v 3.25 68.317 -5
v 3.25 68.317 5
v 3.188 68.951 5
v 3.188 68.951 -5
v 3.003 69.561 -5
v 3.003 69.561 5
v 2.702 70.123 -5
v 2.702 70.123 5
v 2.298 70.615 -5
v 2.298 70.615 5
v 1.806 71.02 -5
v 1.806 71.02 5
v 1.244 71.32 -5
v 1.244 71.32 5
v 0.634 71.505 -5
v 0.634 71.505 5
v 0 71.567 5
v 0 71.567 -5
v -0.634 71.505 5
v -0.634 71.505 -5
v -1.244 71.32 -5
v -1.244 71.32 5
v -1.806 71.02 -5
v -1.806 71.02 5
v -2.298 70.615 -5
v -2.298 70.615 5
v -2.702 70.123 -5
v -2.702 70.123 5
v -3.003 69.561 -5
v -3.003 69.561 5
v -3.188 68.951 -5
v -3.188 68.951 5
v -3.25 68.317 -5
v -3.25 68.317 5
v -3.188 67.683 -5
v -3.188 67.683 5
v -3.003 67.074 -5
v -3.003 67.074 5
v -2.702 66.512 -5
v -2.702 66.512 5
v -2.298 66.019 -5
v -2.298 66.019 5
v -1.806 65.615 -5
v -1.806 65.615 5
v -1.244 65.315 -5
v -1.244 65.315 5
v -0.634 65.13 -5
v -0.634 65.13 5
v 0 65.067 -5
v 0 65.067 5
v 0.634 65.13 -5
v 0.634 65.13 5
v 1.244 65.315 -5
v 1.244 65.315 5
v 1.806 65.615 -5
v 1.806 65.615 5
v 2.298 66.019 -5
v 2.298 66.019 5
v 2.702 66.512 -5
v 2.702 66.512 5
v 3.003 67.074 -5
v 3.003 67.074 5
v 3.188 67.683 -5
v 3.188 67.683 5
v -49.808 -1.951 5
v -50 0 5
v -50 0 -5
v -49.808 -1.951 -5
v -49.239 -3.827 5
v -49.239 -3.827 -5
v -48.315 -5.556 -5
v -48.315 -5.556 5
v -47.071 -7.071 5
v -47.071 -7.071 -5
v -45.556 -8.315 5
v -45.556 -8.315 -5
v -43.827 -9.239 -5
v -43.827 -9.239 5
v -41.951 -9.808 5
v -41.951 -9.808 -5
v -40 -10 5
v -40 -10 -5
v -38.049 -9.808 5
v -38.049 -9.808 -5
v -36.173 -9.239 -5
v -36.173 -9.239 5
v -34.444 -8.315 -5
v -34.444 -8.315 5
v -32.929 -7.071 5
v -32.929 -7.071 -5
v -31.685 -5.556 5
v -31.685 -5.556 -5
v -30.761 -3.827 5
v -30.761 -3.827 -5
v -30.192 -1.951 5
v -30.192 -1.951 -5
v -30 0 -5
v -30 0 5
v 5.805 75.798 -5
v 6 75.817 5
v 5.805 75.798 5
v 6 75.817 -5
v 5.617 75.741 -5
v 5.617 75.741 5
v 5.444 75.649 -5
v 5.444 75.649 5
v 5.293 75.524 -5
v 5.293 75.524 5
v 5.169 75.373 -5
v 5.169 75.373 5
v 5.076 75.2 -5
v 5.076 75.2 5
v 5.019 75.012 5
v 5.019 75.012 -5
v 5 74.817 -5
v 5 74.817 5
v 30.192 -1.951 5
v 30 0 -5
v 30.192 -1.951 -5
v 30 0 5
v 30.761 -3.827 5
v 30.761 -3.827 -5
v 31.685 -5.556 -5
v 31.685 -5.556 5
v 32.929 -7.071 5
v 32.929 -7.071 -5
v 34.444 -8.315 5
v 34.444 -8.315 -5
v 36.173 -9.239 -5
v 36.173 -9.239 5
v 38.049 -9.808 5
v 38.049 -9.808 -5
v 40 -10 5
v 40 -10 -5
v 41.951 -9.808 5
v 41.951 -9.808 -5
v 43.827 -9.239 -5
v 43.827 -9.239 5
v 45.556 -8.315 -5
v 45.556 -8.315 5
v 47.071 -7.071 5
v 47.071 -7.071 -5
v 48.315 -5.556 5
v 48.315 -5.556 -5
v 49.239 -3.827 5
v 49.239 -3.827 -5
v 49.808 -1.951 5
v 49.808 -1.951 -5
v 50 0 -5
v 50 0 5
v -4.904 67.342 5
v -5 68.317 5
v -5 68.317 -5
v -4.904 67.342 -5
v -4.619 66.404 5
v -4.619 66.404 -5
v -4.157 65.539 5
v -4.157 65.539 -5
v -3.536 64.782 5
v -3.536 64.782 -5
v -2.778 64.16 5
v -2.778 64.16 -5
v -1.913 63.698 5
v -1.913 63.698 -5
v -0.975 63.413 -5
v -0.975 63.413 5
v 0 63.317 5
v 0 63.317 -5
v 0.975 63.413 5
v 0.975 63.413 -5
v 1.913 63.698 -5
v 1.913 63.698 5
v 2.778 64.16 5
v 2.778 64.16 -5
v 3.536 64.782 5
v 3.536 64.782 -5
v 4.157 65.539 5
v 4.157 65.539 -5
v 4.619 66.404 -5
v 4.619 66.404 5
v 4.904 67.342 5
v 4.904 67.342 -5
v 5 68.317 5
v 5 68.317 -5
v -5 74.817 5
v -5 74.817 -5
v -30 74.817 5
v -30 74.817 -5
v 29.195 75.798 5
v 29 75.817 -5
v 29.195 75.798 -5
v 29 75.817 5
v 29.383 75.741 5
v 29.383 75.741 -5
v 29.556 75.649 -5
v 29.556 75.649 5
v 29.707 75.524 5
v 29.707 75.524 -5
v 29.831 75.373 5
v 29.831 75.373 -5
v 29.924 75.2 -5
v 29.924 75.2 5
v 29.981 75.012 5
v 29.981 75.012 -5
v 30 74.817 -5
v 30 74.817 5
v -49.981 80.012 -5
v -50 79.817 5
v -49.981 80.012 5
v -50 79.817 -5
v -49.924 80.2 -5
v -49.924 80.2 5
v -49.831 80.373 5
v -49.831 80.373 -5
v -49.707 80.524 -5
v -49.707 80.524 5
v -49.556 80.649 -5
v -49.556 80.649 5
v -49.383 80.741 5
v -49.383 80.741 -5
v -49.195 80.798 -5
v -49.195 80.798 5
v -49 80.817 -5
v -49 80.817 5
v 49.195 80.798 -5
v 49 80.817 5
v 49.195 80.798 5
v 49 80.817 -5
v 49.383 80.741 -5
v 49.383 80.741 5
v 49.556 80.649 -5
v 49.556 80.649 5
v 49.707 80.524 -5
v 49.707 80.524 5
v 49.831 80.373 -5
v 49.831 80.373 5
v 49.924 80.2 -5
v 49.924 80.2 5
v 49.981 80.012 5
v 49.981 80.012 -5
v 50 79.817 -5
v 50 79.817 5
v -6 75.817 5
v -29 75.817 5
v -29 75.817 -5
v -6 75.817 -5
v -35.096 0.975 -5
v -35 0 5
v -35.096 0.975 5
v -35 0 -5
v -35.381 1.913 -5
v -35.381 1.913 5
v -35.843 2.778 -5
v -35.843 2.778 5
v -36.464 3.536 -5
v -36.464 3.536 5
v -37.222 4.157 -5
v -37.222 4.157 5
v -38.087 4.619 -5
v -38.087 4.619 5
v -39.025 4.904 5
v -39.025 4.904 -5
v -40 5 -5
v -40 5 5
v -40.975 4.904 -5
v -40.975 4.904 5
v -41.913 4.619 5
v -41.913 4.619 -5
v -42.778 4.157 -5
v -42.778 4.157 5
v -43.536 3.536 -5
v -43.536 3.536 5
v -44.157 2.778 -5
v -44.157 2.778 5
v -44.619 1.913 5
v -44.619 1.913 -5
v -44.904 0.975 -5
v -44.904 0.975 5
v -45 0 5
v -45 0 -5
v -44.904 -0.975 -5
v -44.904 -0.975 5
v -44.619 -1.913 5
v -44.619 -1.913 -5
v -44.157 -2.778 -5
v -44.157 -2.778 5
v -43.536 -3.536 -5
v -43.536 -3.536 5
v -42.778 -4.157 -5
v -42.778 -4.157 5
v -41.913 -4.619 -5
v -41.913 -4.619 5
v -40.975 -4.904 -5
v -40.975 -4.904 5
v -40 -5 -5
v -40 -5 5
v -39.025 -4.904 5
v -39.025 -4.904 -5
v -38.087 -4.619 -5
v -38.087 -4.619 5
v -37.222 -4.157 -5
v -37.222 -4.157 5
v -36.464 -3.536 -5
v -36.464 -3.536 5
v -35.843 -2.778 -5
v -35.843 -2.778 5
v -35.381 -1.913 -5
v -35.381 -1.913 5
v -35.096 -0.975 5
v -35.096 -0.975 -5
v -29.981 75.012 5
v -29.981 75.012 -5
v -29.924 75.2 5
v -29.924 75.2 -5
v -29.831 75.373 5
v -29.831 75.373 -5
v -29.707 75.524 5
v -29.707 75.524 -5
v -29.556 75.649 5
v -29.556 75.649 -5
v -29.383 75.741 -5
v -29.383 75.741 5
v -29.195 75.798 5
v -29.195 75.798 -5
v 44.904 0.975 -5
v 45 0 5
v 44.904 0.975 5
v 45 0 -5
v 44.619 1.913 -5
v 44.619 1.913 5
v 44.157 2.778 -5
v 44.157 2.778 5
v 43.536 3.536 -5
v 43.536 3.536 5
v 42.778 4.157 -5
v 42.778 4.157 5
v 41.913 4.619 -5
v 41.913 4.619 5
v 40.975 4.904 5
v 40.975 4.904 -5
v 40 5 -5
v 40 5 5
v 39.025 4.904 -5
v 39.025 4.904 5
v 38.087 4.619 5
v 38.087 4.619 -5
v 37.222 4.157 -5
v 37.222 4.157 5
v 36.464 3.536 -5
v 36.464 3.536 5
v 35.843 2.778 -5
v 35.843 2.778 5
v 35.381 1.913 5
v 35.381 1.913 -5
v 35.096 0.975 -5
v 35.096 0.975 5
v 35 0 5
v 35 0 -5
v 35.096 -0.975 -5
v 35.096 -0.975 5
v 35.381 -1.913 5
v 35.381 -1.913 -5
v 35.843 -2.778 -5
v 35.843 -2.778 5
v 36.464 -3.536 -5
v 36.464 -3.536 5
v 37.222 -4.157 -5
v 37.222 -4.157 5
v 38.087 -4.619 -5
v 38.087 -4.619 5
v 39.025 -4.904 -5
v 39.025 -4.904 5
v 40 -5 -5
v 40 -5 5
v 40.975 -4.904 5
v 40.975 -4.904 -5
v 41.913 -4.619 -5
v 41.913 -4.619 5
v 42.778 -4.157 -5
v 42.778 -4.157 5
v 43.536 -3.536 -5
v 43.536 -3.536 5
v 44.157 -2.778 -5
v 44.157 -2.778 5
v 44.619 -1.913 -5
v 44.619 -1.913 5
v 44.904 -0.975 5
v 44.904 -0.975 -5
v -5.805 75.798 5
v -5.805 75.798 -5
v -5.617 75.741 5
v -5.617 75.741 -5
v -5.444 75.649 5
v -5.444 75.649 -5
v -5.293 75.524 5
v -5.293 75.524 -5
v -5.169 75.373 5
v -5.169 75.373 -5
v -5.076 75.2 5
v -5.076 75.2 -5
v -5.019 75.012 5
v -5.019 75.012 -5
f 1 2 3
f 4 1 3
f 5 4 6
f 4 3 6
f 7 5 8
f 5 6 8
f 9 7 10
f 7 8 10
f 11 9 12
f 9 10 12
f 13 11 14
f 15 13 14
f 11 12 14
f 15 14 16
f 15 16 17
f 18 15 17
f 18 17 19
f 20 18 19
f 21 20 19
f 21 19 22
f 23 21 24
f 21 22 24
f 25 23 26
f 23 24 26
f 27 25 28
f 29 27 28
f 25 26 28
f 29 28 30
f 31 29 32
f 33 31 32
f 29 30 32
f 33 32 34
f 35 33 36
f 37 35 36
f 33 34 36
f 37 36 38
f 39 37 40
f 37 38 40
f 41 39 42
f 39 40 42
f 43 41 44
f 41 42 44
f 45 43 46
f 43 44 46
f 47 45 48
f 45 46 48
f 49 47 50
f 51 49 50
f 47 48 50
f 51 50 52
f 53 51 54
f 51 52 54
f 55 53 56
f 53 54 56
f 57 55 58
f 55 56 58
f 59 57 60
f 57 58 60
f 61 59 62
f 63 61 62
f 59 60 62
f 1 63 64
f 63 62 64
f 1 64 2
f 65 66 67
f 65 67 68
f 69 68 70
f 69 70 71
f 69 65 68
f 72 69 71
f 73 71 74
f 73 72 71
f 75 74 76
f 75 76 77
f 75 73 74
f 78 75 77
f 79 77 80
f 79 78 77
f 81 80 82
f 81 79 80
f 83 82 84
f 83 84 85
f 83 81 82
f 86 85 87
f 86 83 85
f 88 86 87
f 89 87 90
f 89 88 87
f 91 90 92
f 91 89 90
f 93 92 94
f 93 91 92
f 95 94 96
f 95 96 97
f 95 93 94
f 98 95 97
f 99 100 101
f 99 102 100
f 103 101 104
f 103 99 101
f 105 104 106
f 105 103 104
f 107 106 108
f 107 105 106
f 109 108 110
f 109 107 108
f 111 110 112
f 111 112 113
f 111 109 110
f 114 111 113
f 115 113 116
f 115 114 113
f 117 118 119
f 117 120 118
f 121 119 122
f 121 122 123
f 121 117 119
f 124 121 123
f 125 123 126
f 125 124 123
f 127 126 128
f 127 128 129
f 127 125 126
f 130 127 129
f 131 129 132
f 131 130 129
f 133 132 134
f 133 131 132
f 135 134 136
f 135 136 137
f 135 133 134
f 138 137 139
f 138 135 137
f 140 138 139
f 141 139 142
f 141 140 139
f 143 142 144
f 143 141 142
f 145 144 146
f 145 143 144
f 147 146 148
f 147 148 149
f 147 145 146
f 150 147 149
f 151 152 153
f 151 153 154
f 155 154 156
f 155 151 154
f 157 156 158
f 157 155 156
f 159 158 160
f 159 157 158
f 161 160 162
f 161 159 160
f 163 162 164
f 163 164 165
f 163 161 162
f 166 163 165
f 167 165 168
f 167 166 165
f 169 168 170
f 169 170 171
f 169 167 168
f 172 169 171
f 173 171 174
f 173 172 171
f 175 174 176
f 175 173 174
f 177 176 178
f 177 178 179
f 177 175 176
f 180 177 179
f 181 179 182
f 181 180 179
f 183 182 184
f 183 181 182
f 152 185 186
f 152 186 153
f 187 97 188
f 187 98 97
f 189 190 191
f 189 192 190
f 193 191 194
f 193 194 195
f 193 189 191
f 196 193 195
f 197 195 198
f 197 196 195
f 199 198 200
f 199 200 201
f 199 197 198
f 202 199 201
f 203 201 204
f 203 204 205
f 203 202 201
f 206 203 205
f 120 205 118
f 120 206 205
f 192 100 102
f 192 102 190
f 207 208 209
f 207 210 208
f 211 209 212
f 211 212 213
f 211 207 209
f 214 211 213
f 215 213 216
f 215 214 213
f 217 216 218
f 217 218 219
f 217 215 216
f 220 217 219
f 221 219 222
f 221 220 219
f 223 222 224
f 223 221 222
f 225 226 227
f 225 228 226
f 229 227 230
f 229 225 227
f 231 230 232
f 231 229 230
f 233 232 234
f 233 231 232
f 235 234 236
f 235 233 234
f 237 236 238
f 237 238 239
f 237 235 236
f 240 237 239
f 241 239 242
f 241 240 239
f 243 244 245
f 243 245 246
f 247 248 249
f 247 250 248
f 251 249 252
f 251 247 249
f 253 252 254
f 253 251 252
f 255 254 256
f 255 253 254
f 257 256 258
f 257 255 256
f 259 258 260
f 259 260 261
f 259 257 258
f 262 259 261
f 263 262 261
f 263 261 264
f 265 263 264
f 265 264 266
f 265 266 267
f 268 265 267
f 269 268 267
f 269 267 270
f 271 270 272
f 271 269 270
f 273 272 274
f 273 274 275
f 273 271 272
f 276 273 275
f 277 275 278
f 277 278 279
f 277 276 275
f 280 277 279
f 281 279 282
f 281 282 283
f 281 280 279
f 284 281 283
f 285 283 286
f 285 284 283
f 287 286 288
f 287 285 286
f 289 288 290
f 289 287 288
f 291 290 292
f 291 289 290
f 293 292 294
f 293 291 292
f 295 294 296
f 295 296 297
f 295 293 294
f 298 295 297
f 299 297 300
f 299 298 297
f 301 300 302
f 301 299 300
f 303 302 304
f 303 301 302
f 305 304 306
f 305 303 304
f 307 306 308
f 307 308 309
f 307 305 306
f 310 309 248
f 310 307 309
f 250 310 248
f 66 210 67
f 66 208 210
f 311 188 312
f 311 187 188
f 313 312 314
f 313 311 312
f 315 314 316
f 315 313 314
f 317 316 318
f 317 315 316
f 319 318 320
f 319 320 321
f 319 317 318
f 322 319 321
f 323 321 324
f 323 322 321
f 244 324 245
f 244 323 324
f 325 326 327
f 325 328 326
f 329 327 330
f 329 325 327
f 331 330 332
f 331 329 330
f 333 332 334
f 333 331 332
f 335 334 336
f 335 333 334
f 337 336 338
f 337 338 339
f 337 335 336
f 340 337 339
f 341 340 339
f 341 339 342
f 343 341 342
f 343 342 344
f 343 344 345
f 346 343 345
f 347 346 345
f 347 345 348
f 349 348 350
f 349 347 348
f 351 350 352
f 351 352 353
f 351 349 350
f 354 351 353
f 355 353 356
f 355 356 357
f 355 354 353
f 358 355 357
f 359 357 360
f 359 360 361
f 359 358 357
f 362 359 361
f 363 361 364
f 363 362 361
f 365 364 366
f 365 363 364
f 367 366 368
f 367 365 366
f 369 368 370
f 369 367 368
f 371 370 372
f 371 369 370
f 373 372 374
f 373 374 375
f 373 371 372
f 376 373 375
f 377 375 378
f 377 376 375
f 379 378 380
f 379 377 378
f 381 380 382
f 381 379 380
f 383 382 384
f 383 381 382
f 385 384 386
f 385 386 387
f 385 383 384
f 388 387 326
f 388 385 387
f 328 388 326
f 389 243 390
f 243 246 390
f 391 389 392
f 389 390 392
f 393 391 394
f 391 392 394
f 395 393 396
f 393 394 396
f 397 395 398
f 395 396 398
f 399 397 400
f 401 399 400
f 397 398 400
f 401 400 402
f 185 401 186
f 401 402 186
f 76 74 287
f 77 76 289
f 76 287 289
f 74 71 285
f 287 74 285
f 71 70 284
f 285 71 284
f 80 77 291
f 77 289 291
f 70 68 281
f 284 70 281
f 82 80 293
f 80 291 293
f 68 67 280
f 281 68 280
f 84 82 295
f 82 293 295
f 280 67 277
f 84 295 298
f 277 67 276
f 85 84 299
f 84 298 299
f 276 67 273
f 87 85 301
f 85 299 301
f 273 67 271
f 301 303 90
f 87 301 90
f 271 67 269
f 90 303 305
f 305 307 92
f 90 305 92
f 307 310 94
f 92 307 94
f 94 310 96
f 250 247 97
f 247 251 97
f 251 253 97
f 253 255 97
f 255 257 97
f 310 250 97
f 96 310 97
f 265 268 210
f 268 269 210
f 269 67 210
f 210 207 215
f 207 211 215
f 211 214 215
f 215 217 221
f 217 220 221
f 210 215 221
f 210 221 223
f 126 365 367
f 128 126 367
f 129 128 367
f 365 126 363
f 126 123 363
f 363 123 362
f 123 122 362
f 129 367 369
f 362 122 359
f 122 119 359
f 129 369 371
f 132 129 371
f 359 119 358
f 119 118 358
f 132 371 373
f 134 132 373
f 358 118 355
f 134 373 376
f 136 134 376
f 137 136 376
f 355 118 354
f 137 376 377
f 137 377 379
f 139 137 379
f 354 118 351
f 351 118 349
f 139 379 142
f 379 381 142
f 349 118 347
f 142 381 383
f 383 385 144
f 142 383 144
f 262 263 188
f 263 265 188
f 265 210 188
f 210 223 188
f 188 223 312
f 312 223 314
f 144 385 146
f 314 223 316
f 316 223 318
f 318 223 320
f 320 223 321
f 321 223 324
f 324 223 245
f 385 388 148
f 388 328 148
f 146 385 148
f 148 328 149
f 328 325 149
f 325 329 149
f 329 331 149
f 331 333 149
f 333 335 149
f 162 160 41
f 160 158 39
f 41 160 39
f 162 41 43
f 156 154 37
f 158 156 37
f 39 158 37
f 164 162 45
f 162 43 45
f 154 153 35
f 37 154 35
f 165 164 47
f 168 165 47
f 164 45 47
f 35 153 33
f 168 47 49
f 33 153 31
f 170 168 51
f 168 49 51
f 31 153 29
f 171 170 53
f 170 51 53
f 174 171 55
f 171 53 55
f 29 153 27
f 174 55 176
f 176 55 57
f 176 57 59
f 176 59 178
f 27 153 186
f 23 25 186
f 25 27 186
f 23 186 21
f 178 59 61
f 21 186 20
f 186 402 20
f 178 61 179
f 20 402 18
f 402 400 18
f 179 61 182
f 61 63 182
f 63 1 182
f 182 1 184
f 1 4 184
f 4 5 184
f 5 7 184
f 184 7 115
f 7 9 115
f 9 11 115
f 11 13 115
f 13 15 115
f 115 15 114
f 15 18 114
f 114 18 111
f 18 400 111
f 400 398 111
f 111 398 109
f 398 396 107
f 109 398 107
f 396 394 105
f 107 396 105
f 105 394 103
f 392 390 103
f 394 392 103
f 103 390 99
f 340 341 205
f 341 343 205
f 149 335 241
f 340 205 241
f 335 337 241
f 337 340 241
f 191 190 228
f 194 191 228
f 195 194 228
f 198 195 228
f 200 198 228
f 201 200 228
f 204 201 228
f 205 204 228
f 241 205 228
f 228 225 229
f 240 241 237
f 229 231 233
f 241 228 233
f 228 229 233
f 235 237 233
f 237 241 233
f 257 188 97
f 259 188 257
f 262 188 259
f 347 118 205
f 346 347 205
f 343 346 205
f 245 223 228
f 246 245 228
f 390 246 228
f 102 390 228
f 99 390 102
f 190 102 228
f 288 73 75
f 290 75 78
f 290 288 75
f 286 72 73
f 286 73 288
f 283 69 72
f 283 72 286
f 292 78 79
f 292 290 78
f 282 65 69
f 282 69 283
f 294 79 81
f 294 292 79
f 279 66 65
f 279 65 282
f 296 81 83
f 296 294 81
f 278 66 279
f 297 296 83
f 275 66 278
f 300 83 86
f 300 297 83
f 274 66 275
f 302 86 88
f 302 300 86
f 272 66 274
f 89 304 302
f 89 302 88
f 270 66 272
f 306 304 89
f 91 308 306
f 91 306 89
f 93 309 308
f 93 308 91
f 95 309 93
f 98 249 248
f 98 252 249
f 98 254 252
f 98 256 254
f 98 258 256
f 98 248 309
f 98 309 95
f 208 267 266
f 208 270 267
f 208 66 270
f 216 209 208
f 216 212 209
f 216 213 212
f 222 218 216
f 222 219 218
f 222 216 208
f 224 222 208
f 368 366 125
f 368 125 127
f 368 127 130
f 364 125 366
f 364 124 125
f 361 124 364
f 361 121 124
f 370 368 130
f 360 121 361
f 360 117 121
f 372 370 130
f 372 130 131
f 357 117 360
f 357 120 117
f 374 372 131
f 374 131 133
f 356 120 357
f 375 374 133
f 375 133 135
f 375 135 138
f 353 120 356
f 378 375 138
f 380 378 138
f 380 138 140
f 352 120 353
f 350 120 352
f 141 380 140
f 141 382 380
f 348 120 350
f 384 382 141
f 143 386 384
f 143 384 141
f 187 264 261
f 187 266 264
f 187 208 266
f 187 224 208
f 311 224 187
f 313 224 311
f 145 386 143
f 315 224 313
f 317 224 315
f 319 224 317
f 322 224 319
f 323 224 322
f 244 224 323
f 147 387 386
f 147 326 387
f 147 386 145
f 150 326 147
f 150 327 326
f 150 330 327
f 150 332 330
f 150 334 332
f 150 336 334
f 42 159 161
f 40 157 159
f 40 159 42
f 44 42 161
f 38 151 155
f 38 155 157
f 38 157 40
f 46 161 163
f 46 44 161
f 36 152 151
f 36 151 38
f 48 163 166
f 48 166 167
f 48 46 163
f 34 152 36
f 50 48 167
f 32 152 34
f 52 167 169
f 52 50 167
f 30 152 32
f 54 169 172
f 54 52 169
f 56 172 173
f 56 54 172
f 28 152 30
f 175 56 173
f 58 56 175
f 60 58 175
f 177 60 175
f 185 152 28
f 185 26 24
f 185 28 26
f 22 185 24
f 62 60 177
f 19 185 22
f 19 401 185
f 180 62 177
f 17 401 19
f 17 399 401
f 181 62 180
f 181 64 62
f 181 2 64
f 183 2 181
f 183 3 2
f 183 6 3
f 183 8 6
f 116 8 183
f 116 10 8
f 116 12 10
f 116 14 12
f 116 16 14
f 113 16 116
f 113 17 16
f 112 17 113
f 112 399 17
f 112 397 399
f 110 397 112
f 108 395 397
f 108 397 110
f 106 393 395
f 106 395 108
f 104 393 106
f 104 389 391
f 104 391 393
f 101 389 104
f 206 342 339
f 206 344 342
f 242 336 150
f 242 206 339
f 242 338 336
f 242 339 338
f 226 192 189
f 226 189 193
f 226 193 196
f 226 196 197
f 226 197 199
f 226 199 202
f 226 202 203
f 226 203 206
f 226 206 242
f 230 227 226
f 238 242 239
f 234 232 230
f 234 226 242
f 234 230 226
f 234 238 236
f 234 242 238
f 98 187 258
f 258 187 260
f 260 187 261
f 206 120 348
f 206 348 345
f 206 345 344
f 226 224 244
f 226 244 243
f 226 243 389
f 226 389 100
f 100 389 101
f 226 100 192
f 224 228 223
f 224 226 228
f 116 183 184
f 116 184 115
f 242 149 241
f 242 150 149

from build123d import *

# Parameters (mm, degrees)
SKETCH1_W           = 60
SKETCH1_H           = 5
SKETCH1_R           = 10
SKETCH1_R_2         = 5
BOSS_EXTRUDE1_DEPTH = 5
SKETCH2_R           = 3.25
BOSS_EXTRUDE2_DEPTH = 10
FILLET1_R           = 1


with BuildPart() as part:
    # Sketch1 → Boss-Extrude1 (new, symmetric)
    with BuildSketch(Plane.XY):
        with BuildLine():
            Line((-50, 80.817230765), (-50, 0))
            ThreePointArc((-50, 0), (-40, 10), (-30, 0))
            Line((-30, 0), (-30, 75.817230765))
            Line((-30, 75.817230765), (-30, 80.817230765))
            Line((-30, 80.817230765), (-50, 80.817230765))
        make_face()
        with Locations((0, 78.317230765)):
            Rectangle(SKETCH1_W, SKETCH1_H)
        with BuildLine():
            Line((50, 80.817230765), (30, 80.817230765))
            Line((30, 80.817230765), (30, 75.817230765))
            Line((30, 75.817230765), (30, 0))
            ThreePointArc((30, 0), (40, 10), (50, 0))
            Line((50, 0), (50, 80.817230765))
        make_face()
        with Locations((-40, 0)):
            Circle(SKETCH1_R)
        with Locations((-40, 0)):
            Circle(SKETCH1_R_2, mode=Mode.SUBTRACT)
        with Locations((40, 0)):
            Circle(SKETCH1_R)
        with Locations((40, 0)):
            Circle(SKETCH1_R_2, mode=Mode.SUBTRACT)
    extrude(amount=BOSS_EXTRUDE1_DEPTH, both=True)

    # Sketch2 → Boss-Extrude2 (add)
    with BuildSketch(Plane.XY.offset(5)):
        with BuildLine():
            Line((-5, 75.817230765), (-5, 68.317230765))
            ThreePointArc((-5, 68.317230765), (0, 63.317230765), (5, 68.317230765))
            Line((5, 68.317230765), (5, 75.817230765))
            Line((5, 75.817230765), (-5, 75.817230765))
        make_face()
        with Locations((0, 68.317230765)):
            Circle(SKETCH2_R, mode=Mode.SUBTRACT)
    extrude(amount=-BOSS_EXTRUDE2_DEPTH)

    # Fillet1
    fillet1_edges = [part.edges().sort_by_distance(p)[0] for p in [
        (-50, 80.817230765, 0),
        (50, 80.817230765, 0),
        (30, 75.817230765, 0),
        (-30, 75.817230765, 0),
        (-5, 75.817230765, 0),
        (5, 75.817230765, 0),
    ]]
    fillet(fillet1_edges, radius=FILLET1_R)


solid = part.part
